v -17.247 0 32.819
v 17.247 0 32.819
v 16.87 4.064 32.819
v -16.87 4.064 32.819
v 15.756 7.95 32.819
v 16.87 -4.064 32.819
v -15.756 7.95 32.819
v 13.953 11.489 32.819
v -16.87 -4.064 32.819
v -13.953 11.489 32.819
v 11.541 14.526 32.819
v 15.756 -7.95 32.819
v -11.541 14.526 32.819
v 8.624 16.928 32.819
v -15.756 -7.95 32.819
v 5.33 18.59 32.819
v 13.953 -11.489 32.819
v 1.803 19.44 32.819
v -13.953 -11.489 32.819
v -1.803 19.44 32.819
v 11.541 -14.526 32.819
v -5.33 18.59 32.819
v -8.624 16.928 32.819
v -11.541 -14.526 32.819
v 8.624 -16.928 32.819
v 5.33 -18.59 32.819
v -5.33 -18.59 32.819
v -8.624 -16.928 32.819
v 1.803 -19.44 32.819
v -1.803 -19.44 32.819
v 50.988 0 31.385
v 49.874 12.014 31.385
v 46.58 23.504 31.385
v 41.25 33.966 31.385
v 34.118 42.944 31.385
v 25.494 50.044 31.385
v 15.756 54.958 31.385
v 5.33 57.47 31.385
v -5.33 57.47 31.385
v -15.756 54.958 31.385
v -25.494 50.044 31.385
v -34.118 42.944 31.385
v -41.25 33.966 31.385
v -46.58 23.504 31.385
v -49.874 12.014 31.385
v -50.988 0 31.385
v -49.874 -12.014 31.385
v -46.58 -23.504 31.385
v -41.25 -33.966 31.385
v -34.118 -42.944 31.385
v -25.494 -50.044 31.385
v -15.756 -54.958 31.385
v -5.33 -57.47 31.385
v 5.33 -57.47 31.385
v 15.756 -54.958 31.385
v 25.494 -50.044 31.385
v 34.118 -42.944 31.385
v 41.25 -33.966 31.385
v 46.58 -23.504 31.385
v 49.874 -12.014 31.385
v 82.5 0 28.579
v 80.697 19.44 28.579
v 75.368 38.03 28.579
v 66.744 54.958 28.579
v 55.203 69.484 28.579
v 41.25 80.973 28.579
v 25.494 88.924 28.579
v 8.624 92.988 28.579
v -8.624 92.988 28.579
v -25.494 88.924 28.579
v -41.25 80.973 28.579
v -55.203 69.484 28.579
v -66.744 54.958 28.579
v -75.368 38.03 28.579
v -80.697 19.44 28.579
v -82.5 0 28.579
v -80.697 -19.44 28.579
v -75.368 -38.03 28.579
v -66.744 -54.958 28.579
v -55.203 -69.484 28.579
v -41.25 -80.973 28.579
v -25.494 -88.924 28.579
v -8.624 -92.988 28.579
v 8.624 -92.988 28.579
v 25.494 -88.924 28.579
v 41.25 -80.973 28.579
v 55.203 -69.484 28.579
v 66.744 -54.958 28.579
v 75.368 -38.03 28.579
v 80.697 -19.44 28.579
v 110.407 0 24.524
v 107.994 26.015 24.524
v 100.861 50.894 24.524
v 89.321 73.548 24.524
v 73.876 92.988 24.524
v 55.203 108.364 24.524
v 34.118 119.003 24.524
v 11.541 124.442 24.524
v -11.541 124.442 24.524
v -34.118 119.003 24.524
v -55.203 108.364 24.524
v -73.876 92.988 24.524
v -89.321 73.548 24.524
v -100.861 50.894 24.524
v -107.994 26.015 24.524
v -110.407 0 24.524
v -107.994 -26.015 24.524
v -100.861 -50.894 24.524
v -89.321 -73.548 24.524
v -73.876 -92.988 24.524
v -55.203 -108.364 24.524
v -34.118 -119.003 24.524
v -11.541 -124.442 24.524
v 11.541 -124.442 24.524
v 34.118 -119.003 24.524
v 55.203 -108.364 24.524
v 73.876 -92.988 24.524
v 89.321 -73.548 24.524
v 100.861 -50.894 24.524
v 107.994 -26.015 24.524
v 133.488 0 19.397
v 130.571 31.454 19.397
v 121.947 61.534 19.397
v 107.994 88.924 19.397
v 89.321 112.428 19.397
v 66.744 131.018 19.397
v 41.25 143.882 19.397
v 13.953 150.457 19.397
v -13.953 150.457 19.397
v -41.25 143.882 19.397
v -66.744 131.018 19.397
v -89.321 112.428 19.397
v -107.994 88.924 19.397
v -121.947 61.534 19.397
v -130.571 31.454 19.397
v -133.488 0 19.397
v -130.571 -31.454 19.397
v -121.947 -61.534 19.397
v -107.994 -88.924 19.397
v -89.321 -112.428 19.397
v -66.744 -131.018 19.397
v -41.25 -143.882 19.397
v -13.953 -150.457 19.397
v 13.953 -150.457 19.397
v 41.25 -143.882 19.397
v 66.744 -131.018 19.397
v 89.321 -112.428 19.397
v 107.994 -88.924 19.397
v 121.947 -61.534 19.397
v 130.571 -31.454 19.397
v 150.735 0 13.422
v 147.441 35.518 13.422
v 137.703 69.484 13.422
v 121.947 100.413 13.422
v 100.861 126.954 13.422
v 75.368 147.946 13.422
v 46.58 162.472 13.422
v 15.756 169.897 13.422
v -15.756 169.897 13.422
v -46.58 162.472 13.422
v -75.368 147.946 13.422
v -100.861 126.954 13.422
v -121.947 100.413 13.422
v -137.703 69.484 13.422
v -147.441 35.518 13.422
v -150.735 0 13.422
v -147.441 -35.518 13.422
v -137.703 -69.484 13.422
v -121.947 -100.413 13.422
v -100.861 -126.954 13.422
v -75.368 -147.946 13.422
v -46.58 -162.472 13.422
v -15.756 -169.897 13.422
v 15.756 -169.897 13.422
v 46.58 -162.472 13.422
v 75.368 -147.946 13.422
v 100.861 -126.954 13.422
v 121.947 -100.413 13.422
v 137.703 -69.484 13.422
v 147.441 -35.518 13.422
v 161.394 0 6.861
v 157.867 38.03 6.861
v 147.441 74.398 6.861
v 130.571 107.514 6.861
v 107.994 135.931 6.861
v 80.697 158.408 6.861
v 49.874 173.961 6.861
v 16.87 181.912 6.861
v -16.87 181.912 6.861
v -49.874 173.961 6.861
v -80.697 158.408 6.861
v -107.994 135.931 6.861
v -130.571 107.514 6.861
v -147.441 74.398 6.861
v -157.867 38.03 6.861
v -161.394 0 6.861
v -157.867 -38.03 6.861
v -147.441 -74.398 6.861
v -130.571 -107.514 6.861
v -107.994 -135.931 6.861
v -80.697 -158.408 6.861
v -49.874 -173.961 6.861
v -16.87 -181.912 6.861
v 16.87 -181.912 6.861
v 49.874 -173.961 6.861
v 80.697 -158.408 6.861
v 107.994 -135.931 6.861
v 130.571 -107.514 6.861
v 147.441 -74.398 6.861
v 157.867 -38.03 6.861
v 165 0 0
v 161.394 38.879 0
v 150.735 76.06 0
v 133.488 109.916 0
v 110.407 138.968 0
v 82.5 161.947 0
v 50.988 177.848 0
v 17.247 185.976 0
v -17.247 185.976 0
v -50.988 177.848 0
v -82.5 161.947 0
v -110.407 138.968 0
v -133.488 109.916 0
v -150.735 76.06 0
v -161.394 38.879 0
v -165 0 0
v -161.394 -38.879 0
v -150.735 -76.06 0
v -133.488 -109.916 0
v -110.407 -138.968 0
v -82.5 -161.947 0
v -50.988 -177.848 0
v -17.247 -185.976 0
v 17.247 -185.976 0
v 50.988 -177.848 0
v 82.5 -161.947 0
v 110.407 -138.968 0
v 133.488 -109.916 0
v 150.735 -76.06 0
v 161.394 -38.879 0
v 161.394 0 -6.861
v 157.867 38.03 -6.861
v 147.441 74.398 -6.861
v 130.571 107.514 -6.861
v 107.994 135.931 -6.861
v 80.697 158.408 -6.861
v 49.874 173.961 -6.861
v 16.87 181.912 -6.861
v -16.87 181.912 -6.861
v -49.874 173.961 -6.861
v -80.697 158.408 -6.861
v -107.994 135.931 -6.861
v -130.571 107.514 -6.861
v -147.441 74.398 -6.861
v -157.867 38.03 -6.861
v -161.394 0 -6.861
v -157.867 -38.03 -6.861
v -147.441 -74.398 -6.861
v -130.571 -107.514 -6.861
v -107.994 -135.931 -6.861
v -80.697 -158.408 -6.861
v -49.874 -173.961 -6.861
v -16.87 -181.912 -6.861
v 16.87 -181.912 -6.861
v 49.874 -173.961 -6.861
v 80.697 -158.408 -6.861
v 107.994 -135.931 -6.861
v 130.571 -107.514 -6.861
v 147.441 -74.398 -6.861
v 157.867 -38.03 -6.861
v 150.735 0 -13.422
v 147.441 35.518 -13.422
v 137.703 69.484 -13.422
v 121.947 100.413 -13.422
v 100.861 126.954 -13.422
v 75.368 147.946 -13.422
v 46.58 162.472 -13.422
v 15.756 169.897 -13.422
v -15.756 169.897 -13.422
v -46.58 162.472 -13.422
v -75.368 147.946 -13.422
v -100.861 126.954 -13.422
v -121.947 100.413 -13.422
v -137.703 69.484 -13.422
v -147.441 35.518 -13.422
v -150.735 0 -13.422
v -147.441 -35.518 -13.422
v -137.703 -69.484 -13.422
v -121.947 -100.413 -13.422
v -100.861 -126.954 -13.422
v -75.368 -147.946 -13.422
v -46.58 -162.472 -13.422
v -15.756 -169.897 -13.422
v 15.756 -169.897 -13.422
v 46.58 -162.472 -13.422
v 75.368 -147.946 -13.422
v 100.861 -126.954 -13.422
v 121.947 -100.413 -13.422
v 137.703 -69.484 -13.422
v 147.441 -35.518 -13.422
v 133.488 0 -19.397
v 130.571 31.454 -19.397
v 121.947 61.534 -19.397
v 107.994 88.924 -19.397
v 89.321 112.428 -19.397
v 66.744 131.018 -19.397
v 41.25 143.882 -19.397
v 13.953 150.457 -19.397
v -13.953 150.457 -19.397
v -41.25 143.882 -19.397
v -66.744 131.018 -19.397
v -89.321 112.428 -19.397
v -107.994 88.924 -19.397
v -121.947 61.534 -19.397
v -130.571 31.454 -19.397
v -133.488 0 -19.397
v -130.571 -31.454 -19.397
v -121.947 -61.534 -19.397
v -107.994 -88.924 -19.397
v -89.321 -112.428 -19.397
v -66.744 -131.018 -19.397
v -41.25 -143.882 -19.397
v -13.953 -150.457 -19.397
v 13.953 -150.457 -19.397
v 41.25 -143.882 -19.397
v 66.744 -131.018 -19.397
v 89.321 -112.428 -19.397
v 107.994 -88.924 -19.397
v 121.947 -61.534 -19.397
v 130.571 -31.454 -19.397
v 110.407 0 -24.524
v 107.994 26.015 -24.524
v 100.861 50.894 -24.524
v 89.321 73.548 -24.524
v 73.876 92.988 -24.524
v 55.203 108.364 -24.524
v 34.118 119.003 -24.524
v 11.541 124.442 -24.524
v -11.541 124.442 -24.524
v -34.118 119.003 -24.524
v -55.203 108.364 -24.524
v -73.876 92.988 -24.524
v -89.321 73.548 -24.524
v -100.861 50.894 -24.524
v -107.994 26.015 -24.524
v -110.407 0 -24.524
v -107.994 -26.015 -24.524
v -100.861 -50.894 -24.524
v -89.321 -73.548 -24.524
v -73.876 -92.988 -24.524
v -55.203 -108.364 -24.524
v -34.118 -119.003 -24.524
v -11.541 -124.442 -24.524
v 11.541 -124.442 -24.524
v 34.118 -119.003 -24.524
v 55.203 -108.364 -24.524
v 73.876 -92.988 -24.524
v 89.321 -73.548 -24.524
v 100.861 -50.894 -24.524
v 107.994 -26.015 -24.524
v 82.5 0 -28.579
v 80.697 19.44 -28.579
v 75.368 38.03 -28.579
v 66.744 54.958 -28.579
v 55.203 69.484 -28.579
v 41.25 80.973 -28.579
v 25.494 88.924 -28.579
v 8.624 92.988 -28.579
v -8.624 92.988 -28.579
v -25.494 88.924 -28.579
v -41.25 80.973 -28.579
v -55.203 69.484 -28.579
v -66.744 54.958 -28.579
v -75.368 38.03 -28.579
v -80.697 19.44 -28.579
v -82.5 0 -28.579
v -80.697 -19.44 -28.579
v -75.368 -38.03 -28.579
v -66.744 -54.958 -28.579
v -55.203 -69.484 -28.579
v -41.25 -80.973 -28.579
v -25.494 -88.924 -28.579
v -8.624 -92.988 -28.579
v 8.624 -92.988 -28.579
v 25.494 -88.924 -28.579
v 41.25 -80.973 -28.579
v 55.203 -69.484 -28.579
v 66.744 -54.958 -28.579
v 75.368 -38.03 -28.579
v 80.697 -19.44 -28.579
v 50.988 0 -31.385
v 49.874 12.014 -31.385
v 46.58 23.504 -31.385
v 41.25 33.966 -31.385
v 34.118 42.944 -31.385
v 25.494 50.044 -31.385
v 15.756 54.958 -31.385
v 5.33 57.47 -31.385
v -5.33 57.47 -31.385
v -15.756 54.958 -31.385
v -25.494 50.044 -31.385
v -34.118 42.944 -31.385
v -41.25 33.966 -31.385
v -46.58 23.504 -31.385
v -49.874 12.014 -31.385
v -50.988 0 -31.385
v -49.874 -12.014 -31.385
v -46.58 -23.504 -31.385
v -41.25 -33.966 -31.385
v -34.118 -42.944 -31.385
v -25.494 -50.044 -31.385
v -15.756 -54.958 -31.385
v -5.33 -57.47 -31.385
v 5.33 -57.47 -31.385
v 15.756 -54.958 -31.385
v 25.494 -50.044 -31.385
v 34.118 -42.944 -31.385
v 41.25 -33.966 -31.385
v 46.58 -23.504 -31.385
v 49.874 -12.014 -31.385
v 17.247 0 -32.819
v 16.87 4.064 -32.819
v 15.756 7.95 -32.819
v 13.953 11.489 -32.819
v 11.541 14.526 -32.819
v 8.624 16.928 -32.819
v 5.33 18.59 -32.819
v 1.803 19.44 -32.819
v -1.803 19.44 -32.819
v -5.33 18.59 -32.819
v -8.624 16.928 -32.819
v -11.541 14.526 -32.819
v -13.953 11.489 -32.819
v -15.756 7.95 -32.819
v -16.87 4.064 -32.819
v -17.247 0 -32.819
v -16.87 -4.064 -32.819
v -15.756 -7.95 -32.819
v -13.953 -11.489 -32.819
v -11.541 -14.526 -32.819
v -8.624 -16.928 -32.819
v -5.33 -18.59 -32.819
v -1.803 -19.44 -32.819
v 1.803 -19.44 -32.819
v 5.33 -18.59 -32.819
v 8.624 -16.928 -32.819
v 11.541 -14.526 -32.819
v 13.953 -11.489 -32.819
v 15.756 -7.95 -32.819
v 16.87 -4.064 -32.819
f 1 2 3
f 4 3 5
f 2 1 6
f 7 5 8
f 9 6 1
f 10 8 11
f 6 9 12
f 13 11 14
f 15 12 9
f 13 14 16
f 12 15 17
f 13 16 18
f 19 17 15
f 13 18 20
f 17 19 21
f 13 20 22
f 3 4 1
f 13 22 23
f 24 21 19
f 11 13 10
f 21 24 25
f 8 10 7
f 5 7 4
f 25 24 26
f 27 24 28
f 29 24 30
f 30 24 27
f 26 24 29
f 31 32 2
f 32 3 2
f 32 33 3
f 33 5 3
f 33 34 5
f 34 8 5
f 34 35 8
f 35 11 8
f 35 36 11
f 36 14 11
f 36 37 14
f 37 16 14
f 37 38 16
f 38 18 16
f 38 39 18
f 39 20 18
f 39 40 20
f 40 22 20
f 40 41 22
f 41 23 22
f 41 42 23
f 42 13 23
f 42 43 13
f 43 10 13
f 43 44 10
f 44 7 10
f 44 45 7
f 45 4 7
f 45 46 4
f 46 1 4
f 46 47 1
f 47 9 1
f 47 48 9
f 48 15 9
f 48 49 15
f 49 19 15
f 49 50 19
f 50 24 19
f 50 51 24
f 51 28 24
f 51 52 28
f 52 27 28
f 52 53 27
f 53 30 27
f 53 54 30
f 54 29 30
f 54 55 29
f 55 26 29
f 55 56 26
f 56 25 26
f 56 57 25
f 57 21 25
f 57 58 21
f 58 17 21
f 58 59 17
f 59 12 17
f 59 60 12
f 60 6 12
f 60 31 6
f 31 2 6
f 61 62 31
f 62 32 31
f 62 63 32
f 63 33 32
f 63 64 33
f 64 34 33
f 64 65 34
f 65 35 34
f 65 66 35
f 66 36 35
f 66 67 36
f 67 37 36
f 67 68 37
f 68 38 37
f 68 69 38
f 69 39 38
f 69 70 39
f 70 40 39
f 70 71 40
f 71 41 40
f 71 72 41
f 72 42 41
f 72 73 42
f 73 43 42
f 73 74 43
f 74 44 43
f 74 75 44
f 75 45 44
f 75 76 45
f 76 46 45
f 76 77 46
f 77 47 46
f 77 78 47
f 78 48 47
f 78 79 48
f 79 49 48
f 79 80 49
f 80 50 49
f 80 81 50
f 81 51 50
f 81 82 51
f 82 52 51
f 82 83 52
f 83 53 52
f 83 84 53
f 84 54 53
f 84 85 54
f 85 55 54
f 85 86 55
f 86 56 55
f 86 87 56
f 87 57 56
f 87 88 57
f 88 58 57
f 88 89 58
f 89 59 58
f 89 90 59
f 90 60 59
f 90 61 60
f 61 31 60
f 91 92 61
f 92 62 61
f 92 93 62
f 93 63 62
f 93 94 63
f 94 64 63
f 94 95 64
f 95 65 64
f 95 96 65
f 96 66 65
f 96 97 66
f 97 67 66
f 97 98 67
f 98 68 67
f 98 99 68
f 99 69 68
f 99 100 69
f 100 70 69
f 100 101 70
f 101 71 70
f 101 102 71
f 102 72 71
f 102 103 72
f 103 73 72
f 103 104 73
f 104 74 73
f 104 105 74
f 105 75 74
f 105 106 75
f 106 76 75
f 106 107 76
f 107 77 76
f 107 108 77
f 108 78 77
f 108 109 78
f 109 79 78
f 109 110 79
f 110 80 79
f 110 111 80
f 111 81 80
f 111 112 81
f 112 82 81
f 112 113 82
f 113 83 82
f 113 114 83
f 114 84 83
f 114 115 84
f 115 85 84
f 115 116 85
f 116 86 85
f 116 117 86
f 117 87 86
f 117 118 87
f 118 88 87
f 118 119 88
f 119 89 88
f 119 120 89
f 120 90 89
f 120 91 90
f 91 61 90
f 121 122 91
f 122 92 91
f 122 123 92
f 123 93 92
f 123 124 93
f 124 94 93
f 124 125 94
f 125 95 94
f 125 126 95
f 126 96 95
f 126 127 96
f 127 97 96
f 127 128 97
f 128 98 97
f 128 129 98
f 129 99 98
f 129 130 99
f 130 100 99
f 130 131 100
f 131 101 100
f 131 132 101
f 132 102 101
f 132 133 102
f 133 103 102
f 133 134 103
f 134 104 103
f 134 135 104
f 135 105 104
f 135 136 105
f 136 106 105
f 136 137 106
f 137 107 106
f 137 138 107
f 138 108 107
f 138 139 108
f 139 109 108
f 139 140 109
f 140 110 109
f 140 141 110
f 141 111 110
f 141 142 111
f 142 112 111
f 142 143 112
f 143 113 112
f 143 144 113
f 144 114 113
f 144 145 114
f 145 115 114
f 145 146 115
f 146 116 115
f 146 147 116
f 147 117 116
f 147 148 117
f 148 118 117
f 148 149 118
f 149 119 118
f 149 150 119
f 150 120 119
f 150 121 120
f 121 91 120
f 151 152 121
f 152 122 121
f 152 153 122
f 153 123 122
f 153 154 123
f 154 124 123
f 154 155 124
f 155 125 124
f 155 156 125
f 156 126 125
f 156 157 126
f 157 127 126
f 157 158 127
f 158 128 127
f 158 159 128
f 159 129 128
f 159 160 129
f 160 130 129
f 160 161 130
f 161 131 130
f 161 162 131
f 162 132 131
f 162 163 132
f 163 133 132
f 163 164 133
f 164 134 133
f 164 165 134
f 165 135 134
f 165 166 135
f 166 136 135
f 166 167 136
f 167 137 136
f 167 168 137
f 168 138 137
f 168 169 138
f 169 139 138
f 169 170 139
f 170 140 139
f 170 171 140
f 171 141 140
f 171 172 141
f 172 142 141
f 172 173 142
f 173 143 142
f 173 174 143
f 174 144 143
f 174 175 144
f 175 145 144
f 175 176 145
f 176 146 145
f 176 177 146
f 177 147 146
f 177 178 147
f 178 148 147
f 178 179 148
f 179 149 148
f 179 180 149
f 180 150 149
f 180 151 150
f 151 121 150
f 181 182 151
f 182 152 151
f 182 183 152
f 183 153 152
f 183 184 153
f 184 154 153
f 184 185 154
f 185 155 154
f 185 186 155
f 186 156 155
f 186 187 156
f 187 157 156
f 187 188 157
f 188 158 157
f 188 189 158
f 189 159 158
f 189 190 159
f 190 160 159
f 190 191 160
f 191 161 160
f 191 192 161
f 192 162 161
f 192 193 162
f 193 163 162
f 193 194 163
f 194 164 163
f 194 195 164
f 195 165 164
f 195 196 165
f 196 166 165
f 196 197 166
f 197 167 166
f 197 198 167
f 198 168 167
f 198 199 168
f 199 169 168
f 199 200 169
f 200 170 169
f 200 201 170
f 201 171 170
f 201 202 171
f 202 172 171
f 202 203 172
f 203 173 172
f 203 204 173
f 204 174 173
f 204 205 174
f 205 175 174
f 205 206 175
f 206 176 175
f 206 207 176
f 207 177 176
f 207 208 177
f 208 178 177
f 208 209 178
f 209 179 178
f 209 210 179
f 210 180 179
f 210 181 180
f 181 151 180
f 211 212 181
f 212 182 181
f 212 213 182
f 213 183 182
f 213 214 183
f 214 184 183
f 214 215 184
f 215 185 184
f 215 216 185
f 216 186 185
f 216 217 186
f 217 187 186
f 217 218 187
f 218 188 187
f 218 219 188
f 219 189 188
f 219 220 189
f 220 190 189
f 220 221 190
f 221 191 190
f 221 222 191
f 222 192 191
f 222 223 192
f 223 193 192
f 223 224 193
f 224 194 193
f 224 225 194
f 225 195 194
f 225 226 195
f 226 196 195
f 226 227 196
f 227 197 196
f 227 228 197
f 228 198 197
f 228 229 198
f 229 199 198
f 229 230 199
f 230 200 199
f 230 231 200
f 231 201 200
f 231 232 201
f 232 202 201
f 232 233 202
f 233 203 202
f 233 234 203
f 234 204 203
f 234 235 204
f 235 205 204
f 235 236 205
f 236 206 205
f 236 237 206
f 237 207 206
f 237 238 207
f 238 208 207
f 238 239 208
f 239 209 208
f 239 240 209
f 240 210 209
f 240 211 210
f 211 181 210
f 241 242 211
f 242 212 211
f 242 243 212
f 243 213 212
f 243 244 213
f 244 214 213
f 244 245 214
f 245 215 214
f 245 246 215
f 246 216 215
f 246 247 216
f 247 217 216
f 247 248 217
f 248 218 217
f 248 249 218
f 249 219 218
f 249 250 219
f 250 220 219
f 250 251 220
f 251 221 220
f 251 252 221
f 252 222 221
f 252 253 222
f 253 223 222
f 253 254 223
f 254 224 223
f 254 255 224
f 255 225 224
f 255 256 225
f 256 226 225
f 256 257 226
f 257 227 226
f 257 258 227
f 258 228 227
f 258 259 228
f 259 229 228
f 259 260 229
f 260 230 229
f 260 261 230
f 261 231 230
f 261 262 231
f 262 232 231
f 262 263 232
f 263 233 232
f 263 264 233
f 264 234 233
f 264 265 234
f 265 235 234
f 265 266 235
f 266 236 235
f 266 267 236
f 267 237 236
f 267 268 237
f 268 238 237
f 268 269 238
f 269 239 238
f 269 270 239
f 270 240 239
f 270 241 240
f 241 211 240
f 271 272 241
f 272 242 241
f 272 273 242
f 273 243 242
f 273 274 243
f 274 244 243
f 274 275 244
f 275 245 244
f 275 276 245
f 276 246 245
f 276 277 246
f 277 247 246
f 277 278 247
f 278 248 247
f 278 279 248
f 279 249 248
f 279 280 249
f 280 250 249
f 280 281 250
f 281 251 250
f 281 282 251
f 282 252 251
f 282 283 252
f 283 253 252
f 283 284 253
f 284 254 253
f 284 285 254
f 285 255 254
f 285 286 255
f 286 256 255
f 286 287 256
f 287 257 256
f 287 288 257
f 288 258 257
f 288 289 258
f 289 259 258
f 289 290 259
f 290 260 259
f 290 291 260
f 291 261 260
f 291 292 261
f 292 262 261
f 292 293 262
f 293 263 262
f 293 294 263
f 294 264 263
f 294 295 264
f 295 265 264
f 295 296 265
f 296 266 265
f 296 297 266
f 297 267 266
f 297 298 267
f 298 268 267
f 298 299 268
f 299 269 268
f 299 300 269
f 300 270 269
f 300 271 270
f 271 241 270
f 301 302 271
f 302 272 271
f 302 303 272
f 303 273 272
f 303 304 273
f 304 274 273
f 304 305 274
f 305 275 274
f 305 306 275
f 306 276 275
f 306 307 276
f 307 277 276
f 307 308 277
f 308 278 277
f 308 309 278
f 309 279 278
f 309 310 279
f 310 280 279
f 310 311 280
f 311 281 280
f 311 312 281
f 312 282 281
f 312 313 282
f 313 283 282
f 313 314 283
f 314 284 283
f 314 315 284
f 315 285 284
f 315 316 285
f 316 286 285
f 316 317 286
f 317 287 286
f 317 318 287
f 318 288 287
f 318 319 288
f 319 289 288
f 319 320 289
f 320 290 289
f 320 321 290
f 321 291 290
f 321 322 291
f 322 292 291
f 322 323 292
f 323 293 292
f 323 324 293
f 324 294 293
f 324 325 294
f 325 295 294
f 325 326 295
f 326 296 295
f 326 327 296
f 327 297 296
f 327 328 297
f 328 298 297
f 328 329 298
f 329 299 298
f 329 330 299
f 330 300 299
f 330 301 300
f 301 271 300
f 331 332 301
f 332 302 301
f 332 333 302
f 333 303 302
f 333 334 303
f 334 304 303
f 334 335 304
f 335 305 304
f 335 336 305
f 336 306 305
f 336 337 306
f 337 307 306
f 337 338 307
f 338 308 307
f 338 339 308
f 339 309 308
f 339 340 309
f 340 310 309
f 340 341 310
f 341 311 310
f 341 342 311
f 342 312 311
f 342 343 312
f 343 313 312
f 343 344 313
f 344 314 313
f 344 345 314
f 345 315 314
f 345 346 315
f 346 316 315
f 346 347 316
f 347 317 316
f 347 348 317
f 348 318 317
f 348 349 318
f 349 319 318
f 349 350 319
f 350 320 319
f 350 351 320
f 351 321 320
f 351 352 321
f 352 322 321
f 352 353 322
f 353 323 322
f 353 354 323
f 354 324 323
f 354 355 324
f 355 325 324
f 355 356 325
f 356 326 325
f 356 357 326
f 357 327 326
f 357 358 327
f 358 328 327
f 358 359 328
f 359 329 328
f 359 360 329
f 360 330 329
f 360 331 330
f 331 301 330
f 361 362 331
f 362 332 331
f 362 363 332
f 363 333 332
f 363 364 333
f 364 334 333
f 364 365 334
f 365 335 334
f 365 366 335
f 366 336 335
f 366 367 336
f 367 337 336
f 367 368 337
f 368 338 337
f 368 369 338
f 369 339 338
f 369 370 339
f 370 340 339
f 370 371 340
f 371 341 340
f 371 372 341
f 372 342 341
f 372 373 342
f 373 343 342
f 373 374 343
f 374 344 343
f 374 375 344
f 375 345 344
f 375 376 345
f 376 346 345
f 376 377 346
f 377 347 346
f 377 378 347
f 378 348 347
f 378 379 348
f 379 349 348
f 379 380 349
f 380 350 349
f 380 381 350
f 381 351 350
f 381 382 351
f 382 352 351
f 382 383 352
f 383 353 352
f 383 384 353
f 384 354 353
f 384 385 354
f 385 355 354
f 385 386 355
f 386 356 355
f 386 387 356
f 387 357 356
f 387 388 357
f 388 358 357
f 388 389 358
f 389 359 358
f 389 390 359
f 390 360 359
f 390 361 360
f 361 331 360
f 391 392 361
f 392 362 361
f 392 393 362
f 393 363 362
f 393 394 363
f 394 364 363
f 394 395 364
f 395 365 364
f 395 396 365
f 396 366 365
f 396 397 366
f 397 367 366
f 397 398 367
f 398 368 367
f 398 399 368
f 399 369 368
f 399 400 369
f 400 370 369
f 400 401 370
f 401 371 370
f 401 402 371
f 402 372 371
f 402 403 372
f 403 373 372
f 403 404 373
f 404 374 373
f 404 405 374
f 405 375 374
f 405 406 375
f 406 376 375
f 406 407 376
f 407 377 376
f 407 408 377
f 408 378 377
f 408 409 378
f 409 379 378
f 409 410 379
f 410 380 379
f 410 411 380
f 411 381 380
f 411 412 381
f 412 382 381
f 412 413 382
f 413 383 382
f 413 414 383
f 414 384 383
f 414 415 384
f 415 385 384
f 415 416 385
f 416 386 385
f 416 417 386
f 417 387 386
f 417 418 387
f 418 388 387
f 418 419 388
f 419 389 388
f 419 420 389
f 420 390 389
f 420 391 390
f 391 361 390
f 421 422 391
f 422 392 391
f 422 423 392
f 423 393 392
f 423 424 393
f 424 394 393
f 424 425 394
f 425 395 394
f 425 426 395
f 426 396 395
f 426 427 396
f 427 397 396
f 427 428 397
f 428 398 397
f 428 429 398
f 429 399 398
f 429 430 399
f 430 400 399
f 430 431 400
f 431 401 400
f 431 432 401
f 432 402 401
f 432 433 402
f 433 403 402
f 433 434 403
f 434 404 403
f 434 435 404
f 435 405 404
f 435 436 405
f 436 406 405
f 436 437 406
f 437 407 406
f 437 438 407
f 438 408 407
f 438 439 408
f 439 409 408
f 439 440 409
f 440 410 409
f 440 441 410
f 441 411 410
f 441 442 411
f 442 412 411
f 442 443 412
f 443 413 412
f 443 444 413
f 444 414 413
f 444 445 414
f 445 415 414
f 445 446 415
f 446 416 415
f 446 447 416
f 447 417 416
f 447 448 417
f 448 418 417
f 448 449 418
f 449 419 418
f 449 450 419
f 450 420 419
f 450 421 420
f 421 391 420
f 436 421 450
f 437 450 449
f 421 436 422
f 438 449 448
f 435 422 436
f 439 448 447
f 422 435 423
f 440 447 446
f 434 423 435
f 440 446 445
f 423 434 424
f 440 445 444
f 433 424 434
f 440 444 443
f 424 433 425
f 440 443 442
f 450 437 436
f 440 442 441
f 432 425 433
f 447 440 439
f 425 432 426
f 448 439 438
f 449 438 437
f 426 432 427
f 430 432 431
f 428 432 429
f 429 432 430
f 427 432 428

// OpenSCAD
// Generated by SolidPython 1.0.1 on 2020-07-29 00:46:52


scale(v = [15, 17, 3]) {
	sphere(r = 11);
}
/***********************************************
*********      SolidPython code:      **********
************************************************
 
# import packages: SolidPython
from solid import *
from solid.utils import *
from itertools import chain, combinations, permutations


class Resize:

    def __init__(self, scad_file):
        self.scad_file = scad_file
        #self.scad_file = import_scad(scad_file)
        # cone/cylinder param:
        self.r1 = 0
        self.r2 = 0
        self.h = 0
        # rectangular prism param:
        self.w = 0
        self.l = 0
        # ellipse param:
        self.r = 0

    # import OpenScad code (file name corresponds to shape)


    # classify shape + parameters
    def assign(self, param1, param2, param3):
        if self.scad_file == 'cone.scad':
            self.r1 = param1
            self.r2 = param2
            self.h = param3
        elif self.scad_file == 'cylinder.scad':
            self.r1 = param1
            self.r2 = param2
            self.h = param3
        elif self.scad_file == 'rectangularPrism.scad':
            self.h = param1
            self.l = param2
            self.w = param3
        else:
            self.r = param1
            self.h = param2

    # resize parameters
    def iterate(self):
        x = range(3, 20, 2)
        i = 1
        if self.scad_file == 'cone.scad':
            tempList = list(permutations(x, 2))
            for temp in tempList:
                param1 = temp[0]
                param2 = temp[1]
                filepath = 'produced_scad_files/' + 'cone' + str(param1) + '_' + str(param2) + '_' + '.scad'
                scad_render_to_file(cylinder(h=param1, r1=param2, r2=0), filepath)

        elif self.scad_file == 'cylinder.scad':
            tempList = list(permutations(x, 3))
            for temp in tempList:
                param1 = temp[0]
                param2 = temp[1]
                filepath = 'produced_scad_files/' + 'cylinder' + str(param1) + '_' + str(param2) + '_' + '.scad'
                scad_render_to_file(cylinder(h=param1, r1=param2, r2=param2), filepath)

        elif self.scad_file == 'rectangularPrism.scad':
            tempList = list(permutations(x, 3))
            for temp in tempList:
                param1 = temp[0]
                param2 = temp[1]
                param3 = temp[2]
                filepath = 'produced_scad_files/' + 'rectangularPrism' + str(param1) + '_' + str(param2) + '_' + str(
                    param3) + '.scad'
                scad_render_to_file(cube(size=(param1, param2, param3)), filepath)

        elif self.scad_file == 'ellipse.scad':
            tempList = list(permutations(x, 4))
            for temp in tempList:
                param1 = temp[0]
                param2 = temp[1]
                param3 = temp[2]
                param4 = temp[3]
                filepath = 'produced_scad_files/' + 'ellipse' + str(param1) + '_' + str(param2) + '_' + str(param3) + '_' + str(param4) + '.scad'
                scad_render_to_file(scale([param1, param2, param3])(sphere(r=param4)), filepath)

    def render_to_scadfile(self):
        scad_render_to_file(scad, 'example.scad') 
 
************************************************/
